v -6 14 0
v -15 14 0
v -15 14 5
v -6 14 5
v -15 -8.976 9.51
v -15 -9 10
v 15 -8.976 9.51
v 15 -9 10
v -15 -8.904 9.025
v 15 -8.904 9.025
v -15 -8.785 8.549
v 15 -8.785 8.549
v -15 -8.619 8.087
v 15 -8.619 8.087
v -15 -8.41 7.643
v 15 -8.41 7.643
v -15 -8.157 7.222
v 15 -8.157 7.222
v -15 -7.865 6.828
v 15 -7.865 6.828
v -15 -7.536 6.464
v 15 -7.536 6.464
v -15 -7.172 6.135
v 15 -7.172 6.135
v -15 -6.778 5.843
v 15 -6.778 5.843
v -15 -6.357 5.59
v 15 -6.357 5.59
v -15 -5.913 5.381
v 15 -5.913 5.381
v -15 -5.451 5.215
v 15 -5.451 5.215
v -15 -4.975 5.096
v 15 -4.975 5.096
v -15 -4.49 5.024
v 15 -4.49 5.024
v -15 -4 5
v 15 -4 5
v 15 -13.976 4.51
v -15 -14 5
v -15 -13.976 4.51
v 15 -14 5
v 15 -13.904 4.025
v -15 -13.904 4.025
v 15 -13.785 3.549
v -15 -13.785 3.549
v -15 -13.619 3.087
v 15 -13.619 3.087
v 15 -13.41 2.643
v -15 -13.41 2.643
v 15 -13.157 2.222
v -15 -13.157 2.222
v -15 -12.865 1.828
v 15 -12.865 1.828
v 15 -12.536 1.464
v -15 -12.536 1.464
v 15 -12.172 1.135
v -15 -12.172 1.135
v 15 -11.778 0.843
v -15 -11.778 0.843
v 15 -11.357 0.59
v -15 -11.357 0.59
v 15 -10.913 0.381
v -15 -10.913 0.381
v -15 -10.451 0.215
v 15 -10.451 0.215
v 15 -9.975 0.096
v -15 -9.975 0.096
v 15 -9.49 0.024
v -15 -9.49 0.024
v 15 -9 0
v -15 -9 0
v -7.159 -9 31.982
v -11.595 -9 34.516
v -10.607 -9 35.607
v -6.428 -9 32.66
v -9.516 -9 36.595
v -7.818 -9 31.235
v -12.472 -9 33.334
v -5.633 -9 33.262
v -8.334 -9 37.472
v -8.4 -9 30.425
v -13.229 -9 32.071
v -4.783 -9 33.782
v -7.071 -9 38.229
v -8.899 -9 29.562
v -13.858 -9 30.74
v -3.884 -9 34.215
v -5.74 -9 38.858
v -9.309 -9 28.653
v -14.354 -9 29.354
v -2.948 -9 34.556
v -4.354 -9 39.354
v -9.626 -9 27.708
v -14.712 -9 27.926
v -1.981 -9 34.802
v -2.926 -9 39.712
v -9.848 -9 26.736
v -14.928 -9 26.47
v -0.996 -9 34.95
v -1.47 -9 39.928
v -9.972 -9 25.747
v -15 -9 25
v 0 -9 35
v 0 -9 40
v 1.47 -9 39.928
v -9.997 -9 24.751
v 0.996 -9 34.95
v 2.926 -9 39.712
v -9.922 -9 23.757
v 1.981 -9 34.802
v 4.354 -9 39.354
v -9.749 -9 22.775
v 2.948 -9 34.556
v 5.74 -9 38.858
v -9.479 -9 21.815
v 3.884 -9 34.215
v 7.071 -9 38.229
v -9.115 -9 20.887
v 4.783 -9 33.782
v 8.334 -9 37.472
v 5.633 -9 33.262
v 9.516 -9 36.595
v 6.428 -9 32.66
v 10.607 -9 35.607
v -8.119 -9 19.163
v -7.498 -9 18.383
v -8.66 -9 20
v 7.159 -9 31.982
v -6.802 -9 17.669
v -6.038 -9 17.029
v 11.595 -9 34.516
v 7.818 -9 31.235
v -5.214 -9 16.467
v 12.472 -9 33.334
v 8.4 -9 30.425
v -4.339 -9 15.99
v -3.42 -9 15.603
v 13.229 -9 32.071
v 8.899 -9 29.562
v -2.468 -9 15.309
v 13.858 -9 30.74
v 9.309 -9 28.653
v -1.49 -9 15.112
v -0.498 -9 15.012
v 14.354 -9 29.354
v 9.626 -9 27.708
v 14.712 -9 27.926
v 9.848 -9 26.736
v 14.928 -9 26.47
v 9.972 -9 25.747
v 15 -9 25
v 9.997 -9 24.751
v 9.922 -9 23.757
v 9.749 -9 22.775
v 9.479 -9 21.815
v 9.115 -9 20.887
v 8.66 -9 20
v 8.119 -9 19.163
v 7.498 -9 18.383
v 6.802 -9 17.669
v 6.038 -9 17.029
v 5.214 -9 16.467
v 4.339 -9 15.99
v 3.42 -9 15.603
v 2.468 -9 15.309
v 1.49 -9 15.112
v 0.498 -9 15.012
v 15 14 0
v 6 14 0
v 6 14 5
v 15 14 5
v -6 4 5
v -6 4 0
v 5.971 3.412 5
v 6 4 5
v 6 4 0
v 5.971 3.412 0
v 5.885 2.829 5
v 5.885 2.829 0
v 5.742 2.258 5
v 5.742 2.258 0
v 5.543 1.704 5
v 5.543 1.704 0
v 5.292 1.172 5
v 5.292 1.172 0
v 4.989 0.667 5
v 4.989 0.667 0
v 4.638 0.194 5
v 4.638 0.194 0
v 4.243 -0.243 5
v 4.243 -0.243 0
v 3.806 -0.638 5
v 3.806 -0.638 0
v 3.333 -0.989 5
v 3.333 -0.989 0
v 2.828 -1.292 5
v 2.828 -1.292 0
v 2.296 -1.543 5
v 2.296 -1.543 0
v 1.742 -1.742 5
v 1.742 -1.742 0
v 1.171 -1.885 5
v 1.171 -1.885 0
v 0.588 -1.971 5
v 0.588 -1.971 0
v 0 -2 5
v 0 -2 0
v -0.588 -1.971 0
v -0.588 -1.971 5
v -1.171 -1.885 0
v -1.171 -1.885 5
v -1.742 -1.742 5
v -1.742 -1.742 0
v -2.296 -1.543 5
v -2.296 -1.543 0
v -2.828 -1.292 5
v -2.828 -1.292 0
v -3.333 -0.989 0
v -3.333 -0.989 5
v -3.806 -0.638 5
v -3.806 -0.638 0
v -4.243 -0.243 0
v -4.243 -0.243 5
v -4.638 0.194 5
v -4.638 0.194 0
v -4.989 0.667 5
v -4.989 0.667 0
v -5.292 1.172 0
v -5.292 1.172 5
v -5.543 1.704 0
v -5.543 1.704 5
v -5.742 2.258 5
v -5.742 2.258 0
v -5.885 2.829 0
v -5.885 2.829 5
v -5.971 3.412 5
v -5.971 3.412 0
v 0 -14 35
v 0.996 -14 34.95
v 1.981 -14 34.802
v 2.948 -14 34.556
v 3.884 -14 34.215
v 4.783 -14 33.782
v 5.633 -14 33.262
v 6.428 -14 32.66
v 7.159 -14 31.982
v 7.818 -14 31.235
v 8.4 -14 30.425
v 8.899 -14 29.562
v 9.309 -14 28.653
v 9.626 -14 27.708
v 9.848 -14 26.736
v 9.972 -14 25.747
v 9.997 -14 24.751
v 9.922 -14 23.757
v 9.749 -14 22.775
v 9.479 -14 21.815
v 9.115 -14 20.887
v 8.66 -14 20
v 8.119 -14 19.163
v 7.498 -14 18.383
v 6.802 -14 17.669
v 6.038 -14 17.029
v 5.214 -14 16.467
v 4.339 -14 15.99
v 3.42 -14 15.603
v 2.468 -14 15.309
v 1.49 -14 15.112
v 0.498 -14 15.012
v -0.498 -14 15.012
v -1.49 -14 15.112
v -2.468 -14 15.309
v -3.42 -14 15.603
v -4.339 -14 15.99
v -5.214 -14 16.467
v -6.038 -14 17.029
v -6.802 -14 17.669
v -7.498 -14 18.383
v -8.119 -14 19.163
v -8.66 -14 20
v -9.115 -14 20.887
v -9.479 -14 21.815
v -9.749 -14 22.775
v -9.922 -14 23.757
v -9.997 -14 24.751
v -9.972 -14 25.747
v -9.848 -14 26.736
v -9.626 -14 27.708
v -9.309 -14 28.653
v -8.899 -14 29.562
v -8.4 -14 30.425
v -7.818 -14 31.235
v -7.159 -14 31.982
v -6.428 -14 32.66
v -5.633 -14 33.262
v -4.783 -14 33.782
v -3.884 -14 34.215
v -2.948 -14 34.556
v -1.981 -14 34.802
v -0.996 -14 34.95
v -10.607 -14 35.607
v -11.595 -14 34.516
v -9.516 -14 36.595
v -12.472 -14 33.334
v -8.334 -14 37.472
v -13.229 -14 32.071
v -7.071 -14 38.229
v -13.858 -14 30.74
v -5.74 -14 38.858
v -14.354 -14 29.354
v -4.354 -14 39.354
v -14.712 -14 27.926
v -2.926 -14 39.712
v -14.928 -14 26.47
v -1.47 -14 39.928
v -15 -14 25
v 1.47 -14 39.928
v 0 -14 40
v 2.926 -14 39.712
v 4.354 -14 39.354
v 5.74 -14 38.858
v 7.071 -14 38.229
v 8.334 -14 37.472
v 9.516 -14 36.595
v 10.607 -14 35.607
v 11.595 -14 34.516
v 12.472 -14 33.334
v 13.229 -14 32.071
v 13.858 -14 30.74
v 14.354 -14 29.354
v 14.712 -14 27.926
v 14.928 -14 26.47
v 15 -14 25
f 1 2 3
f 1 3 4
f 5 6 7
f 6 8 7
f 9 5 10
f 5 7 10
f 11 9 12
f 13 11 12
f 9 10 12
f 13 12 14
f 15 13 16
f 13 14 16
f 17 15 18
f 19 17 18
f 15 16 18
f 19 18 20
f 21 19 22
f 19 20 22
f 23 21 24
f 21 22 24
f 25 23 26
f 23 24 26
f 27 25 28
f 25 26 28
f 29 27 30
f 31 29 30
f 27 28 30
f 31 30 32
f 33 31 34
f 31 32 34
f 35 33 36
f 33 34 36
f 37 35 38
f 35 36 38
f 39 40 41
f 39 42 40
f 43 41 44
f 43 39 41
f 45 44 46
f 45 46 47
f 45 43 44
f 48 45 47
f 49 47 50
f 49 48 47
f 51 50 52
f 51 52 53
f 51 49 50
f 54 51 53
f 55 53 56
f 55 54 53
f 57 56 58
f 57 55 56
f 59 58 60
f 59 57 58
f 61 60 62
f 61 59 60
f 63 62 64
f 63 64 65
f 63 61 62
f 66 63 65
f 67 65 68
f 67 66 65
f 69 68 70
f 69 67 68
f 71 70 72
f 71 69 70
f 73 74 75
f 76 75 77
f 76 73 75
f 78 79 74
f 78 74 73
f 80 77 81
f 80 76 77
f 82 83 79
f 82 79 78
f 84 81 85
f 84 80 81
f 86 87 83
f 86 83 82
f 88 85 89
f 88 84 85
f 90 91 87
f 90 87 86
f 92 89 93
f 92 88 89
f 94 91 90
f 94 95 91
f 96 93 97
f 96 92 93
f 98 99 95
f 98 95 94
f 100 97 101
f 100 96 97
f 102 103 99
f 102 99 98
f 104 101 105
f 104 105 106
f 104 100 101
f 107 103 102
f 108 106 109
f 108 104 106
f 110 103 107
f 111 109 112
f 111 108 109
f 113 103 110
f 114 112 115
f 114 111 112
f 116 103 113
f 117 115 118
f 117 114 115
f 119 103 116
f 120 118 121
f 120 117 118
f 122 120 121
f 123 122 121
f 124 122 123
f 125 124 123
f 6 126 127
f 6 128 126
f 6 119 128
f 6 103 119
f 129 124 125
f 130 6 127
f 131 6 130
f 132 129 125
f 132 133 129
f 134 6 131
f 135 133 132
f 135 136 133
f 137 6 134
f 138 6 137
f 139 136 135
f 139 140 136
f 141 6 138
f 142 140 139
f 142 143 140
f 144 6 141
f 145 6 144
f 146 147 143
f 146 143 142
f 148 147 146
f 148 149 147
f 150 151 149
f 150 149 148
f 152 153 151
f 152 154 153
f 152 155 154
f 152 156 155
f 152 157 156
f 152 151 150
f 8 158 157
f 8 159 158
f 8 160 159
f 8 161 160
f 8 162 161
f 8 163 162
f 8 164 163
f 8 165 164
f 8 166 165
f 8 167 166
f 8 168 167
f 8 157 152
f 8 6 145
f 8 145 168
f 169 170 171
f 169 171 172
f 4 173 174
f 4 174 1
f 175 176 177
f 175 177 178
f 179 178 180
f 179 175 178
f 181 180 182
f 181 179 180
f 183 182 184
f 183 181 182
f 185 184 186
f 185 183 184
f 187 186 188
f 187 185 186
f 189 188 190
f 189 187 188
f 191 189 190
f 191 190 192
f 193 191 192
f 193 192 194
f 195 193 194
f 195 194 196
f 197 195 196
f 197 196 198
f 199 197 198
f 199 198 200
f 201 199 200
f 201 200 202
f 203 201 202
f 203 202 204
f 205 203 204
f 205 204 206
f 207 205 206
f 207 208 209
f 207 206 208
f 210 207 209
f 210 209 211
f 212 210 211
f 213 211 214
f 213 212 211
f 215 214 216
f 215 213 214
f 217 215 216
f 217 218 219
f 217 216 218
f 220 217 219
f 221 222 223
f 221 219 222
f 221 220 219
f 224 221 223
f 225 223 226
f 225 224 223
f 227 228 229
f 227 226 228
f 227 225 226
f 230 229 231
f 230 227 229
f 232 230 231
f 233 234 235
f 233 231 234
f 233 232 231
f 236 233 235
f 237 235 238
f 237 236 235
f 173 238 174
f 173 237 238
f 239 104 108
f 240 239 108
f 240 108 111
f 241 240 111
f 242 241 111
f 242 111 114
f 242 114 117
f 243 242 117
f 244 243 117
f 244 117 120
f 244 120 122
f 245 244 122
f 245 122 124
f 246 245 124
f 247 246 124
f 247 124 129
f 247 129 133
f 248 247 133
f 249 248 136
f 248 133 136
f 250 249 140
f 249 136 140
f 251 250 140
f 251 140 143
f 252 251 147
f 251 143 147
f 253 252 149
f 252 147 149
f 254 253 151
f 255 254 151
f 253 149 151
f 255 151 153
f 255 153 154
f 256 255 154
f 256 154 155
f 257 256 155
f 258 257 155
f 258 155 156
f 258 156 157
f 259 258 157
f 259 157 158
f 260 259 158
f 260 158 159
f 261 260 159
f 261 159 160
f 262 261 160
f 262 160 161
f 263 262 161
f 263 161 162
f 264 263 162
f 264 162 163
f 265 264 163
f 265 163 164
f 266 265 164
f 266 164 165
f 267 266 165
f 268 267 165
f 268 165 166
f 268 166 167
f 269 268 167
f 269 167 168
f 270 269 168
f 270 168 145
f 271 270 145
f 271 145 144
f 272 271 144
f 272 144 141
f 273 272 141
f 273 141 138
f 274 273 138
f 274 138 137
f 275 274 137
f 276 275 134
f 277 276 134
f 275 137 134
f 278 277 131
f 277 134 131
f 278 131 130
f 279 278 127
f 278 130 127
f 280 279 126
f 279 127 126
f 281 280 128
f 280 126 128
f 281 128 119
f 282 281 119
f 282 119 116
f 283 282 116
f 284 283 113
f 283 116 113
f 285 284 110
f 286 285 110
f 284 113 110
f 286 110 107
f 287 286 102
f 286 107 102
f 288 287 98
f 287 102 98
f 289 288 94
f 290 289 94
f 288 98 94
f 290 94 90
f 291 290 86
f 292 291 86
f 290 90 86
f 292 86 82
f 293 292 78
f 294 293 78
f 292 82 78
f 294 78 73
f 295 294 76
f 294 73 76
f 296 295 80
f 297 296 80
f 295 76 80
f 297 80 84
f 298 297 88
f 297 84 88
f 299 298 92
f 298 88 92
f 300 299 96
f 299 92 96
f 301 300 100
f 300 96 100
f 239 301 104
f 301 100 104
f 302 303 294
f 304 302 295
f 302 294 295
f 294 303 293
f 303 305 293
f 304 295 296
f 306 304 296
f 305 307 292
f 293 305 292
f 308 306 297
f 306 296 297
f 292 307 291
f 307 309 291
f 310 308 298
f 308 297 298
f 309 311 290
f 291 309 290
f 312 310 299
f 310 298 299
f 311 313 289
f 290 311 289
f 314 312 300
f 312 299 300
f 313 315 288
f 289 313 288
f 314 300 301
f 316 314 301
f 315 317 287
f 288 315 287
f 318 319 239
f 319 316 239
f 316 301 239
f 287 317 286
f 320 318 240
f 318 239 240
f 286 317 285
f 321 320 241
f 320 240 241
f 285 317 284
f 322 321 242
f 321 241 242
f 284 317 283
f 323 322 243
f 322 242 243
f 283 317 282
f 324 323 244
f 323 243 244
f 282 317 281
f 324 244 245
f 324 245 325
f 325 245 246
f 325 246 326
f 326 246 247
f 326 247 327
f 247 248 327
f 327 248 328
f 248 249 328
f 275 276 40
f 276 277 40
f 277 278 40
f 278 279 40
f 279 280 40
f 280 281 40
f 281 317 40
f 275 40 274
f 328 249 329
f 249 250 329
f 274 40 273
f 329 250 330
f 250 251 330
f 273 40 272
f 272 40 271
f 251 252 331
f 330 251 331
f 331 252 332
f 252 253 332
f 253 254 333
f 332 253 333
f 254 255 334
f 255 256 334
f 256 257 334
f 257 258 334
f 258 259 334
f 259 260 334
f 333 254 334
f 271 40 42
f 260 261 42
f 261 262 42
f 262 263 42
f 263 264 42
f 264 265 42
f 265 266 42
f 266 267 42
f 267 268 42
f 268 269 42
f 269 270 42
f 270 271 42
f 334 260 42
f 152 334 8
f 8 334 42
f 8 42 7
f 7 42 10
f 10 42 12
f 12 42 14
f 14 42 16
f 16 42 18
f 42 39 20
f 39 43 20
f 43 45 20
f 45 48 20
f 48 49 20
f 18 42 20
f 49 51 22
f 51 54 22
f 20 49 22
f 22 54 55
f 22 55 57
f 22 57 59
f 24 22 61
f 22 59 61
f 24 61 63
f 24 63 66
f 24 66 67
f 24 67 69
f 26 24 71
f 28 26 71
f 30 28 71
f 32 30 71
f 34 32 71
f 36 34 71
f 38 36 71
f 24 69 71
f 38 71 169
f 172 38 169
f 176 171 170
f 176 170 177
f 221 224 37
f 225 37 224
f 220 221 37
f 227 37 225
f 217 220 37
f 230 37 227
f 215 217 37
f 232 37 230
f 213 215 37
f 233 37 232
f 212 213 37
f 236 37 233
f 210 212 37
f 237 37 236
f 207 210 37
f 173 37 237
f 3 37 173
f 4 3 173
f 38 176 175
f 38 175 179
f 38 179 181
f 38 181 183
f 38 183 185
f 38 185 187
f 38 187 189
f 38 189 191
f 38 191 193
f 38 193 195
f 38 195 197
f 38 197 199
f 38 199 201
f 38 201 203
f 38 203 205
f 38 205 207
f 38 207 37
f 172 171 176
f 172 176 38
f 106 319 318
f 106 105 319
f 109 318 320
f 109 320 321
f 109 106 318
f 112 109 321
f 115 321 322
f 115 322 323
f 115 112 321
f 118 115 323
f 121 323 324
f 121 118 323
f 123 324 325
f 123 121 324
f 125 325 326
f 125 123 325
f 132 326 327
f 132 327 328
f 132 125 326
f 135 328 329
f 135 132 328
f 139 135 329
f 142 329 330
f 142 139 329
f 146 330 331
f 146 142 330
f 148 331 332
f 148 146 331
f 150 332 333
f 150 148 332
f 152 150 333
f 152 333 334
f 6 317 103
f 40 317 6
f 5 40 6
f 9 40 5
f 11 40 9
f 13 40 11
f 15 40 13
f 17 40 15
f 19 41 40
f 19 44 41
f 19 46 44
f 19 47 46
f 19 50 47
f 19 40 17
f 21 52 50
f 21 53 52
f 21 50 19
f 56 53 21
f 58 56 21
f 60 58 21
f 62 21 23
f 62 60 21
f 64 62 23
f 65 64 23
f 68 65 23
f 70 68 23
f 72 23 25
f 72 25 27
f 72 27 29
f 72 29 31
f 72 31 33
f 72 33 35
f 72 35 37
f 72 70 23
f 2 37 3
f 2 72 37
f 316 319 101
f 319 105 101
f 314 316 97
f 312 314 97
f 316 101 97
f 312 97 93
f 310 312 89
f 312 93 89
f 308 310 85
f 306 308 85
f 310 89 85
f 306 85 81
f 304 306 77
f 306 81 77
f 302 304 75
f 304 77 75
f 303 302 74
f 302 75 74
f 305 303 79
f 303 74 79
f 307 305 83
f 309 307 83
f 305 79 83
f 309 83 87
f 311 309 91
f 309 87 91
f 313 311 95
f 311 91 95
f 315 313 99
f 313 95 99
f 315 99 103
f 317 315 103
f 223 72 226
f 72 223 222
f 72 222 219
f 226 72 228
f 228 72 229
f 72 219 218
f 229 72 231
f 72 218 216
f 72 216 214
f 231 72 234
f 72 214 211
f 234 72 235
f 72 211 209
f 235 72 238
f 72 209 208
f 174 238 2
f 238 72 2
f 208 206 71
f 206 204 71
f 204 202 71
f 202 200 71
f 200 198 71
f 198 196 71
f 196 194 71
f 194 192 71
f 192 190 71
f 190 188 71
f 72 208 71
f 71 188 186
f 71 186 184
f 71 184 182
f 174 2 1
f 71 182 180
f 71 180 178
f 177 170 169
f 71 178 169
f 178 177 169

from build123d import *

# Parameters (mm, degrees)
SKETCH_1_W          = 30
SKETCH_1_H          = 28
EXTRUDE_1_DEPTH     = 5
CUT_EXTRUDE_1_DEPTH = 22.118712082
SKETCH_3_W          = 30
SKETCH_3_H          = 5
EXTRUDE_2_DEPTH     = 35
FILLET_1_R          = 5
FILLET_2_R          = 15
FILLET_3_R          = 15
SKETCH_4_R          = 10
CUT_EXTRUDE_2_DEPTH = 49.518037883
FILLET_5_R          = 5


with BuildPart() as part:
    # Эскиз1 → Бобышка-Вытянуть1 (new body)
    with BuildSketch(Plane.XY):
        Rectangle(SKETCH_1_W, SKETCH_1_H)
    extrude(amount=EXTRUDE_1_DEPTH)

    # Эскиз2 → Вырез-Вытянуть1 (cut, through all)
    with BuildSketch(Plane.XY.offset(5)):
        with BuildLine():
            Line((-6, 14), (6, 14))
            Line((6, 14), (6, 4))
            ThreePointArc((6, 4), (0, -2), (-6, 4))
            Line((-6, 4), (-6, 14))
        make_face()
    extrude(amount=-CUT_EXTRUDE_1_DEPTH, mode=Mode.SUBTRACT)

    # Эскиз3 → Бобышка-Вытянуть2 (add)
    with BuildSketch(Plane.XY.offset(5)):
        with Locations((0, -11.5)):
            Rectangle(SKETCH_3_W, SKETCH_3_H)
    extrude(amount=EXTRUDE_2_DEPTH)

    # Скругление1
    fillet_1_edges = [part.edges().sort_by_distance(p)[0] for p in [
        (0, -14, 0),
    ]]
    fillet(fillet_1_edges, radius=FILLET_1_R)

    # Скругление2
    fillet_2_edges = [part.edges().sort_by_distance(p)[0] for p in [
        (15, -11.5, 40),
    ]]
    fillet(fillet_2_edges, radius=FILLET_2_R)

    # Скругление3
    fillet_3_edges = [part.edges().sort_by_distance(p)[0] for p in [
        (-15, -11.5, 40),
    ]]
    fillet(fillet_3_edges, radius=FILLET_3_R - 0.0001)  # a hair under: the kernel refuses the full size

    # Эскиз4 → Вырез-Вытянуть2 (cut, through all)
    with BuildSketch(Plane(origin=(0, -9, 0), x_dir=(1, 0, 0), z_dir=(0, 1, 0))):
        with Locations(Location((0, -25, 0), (0, 0, 270))):
            Circle(SKETCH_4_R)
    extrude(amount=-CUT_EXTRUDE_2_DEPTH, mode=Mode.SUBTRACT)

    # Скругление5
    fillet_5_edges = [part.edges().sort_by_distance(p)[0] for p in [
        (0, -9, 5),
    ]]
    fillet(fillet_5_edges, radius=FILLET_5_R)


solid = part.part
